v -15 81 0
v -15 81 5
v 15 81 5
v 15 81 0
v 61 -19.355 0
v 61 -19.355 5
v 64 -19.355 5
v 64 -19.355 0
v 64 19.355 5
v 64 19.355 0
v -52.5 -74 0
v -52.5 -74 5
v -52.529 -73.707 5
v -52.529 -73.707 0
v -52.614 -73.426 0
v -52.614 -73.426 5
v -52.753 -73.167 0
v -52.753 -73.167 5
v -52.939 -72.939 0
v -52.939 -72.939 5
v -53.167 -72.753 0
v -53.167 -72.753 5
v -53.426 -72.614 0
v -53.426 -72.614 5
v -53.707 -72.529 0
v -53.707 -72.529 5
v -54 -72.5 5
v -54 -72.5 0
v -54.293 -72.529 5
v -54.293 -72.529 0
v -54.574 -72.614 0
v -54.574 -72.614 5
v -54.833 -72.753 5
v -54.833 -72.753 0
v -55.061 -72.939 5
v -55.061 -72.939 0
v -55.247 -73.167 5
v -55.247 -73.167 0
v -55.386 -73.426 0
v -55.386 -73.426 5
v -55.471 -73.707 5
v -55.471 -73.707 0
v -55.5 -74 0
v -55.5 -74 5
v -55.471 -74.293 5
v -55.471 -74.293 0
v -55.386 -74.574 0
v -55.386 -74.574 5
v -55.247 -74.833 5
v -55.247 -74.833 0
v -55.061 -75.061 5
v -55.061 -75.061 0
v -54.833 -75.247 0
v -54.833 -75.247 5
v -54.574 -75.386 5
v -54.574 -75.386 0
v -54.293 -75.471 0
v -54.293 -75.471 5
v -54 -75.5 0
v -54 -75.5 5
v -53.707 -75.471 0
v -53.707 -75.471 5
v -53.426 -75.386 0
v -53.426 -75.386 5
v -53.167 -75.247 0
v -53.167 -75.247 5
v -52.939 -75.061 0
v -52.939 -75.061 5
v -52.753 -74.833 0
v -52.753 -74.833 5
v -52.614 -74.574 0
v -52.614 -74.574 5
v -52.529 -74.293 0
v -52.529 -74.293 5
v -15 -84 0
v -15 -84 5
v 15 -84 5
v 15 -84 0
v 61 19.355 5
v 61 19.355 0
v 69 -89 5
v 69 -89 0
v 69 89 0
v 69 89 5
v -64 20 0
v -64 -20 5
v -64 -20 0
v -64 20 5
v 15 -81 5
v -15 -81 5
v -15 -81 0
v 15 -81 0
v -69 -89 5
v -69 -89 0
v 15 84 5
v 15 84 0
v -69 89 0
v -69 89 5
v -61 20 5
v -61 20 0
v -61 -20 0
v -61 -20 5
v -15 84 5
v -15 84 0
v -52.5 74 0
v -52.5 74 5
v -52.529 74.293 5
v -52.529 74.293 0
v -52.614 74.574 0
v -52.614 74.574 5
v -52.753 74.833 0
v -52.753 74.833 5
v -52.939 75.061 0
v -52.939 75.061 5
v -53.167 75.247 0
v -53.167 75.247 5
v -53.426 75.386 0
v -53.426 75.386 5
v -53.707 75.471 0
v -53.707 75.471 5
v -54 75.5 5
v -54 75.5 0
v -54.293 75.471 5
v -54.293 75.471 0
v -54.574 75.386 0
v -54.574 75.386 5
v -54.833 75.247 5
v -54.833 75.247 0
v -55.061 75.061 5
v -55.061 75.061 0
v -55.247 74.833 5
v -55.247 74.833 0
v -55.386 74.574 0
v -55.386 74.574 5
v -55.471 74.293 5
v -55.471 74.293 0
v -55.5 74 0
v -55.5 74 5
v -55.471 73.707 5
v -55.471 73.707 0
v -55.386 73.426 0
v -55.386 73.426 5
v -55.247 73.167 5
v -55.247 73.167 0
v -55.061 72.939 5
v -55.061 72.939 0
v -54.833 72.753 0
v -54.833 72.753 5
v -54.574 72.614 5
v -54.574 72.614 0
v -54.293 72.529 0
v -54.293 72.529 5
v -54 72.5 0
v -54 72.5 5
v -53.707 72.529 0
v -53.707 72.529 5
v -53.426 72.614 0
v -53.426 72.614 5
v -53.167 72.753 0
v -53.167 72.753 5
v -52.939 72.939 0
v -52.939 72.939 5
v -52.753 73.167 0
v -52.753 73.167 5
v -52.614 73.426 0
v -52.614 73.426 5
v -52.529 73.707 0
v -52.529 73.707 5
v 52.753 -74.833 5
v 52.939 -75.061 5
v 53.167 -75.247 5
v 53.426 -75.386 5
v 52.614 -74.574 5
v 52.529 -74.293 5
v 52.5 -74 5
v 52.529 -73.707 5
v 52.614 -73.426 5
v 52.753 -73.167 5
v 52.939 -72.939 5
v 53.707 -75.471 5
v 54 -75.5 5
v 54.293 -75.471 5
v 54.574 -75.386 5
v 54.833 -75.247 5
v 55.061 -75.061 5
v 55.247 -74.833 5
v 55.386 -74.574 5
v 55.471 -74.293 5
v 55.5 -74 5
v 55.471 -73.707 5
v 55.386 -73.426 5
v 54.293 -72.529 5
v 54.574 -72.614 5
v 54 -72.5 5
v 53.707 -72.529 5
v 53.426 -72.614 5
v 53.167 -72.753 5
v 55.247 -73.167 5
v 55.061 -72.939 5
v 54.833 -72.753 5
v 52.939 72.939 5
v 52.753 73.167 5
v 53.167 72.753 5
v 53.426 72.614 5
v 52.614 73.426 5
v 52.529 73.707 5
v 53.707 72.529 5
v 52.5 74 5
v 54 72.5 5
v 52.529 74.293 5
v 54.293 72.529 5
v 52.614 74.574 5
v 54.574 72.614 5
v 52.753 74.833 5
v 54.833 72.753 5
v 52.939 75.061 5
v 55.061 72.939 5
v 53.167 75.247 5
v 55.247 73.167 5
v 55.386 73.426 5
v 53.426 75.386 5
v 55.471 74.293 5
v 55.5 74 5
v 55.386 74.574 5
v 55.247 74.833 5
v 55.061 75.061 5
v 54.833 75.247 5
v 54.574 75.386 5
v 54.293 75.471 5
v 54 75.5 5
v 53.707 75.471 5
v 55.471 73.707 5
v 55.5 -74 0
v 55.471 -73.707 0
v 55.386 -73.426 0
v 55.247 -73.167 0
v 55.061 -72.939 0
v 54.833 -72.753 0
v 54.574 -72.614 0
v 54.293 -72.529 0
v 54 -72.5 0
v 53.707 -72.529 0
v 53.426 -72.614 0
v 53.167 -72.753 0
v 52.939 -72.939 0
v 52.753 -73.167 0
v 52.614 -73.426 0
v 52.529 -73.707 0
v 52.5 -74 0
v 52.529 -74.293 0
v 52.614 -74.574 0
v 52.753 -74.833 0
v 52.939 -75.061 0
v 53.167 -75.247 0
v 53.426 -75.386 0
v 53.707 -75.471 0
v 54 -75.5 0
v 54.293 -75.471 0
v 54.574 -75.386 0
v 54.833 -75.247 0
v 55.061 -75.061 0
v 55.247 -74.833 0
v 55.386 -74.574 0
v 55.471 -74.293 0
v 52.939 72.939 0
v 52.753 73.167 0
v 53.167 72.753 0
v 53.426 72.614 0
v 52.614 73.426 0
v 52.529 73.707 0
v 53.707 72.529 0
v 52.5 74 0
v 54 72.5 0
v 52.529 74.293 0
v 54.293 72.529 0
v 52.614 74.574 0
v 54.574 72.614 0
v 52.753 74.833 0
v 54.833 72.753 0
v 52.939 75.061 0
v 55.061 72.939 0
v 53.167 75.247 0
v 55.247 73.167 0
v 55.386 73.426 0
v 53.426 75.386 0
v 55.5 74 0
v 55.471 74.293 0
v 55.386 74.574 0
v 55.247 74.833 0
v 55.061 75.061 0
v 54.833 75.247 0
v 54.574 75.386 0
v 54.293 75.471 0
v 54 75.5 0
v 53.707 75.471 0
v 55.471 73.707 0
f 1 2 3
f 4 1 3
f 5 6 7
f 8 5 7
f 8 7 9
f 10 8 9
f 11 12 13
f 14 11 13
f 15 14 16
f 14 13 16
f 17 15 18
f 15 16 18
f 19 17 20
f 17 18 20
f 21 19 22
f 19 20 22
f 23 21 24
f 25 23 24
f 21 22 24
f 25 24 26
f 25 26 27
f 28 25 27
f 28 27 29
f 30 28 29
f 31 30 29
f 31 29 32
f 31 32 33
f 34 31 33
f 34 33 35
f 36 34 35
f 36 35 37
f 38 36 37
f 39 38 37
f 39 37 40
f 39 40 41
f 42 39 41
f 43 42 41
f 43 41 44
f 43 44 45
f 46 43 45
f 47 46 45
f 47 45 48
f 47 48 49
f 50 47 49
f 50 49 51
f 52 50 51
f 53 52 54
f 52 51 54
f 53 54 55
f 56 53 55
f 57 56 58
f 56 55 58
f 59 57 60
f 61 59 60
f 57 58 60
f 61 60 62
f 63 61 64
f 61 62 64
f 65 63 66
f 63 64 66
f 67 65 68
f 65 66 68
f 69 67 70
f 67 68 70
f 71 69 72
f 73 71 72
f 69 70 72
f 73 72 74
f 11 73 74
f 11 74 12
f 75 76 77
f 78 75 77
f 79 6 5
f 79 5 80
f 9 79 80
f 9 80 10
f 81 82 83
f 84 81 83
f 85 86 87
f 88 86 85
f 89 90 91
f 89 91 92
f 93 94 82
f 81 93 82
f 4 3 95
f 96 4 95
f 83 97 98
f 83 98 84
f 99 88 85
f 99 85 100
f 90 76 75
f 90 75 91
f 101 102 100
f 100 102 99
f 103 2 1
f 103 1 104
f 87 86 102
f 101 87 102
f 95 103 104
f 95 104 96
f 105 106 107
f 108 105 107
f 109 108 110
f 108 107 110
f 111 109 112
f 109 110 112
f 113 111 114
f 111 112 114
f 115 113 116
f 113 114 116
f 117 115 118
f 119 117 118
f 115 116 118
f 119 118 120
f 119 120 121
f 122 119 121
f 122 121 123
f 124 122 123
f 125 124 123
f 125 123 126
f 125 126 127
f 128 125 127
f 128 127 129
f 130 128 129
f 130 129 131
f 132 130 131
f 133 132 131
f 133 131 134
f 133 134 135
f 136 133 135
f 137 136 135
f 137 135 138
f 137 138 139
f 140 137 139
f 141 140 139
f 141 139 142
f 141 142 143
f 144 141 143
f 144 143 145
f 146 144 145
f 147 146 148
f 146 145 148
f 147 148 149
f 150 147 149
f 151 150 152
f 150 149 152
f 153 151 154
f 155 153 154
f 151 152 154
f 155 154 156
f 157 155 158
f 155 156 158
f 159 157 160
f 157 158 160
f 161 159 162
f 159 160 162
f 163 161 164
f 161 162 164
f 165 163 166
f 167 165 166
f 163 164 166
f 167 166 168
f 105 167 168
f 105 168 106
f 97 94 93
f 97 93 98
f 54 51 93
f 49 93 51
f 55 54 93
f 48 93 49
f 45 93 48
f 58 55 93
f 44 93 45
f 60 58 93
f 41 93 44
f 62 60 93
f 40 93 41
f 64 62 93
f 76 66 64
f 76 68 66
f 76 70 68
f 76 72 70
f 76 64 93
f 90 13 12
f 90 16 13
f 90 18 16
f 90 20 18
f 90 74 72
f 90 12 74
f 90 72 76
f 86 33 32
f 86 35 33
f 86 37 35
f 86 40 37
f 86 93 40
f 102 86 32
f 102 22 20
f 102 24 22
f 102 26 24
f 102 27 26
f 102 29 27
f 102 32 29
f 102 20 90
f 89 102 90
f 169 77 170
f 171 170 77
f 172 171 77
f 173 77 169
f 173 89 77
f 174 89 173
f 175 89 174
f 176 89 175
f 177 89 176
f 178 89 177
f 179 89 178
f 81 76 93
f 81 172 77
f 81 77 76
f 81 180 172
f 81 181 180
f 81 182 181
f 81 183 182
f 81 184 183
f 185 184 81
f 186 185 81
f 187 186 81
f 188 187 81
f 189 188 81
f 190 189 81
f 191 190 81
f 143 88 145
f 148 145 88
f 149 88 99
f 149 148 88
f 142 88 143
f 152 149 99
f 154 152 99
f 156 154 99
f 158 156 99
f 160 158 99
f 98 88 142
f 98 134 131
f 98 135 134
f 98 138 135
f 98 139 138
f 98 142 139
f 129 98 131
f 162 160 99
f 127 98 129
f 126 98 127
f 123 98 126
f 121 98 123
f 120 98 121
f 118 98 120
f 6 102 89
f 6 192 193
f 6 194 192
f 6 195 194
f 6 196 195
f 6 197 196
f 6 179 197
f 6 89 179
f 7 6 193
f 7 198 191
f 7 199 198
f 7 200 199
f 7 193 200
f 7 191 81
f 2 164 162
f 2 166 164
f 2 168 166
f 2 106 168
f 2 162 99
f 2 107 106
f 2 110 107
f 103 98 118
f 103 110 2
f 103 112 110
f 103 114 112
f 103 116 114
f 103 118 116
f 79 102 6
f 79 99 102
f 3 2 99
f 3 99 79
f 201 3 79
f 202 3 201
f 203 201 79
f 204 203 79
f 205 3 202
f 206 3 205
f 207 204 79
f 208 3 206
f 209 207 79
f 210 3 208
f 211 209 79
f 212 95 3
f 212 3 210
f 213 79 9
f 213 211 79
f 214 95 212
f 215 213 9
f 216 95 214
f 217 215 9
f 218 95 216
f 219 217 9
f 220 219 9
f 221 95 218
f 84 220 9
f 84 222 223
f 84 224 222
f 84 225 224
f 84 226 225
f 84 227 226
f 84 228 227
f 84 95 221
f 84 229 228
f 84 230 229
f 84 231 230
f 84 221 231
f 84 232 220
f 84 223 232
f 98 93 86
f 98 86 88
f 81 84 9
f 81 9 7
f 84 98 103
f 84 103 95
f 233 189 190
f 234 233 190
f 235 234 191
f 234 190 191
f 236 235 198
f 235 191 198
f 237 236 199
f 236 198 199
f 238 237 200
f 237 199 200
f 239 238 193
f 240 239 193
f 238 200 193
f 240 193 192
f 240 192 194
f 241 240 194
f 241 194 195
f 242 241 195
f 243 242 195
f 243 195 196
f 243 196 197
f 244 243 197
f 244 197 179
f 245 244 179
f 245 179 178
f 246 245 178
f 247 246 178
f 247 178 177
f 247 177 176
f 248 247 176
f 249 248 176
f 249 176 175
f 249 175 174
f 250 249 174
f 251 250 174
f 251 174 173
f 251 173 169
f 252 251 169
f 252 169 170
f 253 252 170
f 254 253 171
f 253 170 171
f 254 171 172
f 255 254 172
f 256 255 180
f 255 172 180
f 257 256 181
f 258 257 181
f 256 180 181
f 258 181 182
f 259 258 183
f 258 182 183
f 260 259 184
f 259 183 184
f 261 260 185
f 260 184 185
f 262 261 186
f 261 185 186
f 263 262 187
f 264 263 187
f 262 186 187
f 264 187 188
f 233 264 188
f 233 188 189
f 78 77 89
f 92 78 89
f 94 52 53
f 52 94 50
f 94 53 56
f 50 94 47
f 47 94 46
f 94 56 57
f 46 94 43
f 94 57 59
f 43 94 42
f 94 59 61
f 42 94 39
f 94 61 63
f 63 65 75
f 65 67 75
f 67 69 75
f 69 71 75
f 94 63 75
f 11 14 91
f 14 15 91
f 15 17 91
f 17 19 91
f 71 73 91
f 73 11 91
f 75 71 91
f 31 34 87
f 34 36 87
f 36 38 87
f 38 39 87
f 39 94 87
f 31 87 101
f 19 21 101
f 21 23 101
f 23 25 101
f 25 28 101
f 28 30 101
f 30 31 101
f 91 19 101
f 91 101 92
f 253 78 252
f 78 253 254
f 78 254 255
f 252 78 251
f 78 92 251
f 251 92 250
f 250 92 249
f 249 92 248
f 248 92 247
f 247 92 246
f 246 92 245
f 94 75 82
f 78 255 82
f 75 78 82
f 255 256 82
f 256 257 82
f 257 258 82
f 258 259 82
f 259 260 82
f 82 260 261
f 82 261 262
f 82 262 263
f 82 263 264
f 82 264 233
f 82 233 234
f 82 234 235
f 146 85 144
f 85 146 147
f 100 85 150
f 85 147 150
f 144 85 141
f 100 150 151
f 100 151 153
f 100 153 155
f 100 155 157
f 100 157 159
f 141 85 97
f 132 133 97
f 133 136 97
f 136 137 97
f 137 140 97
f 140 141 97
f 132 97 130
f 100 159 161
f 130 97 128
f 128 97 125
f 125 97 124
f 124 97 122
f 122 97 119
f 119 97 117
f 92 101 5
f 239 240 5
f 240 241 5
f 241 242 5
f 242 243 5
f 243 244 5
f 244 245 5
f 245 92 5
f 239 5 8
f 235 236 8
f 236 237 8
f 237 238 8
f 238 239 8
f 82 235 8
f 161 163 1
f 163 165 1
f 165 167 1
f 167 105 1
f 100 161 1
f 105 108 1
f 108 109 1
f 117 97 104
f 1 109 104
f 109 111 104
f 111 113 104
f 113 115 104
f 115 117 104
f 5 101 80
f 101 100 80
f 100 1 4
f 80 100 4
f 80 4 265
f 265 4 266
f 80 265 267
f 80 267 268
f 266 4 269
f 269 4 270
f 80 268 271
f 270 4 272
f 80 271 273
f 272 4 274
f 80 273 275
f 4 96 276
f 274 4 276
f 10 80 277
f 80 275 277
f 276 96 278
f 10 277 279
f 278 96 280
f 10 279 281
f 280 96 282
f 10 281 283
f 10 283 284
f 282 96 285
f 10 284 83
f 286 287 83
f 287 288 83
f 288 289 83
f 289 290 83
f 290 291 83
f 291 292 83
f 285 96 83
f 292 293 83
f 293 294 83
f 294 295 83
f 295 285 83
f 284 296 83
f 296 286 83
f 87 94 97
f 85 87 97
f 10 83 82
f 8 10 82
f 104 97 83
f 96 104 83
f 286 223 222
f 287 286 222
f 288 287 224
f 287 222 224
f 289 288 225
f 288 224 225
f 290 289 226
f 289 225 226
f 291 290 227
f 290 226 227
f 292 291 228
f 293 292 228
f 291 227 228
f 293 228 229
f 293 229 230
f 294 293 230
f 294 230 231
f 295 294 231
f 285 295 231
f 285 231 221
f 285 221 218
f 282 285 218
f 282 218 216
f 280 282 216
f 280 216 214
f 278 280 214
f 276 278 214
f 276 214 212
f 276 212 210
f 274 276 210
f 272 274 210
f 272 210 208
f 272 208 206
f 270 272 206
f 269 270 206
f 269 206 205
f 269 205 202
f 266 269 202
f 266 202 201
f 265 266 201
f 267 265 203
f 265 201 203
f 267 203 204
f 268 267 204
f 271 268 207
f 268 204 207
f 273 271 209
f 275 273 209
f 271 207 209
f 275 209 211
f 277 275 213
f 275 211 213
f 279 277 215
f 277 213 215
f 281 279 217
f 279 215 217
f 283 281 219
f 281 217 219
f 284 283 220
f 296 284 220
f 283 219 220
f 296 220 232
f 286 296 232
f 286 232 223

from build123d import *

# Parameters (mm, degrees)
SKETCH2_W           = 138
SKETCH2_H           = 178
BOSS_EXTRUDE1_DEPTH = 5
SKETCH3_W           = 30
SKETCH3_H           = 3
CUT_EXTRUDE1_DEPTH  = 6
SKETCH4_W           = 30
SKETCH4_H           = 3
CUT_EXTRUDE2_DEPTH  = 8
SKETCH6_W           = 3
SKETCH6_H           = 38.70967742
CUT_EXTRUDE3_DEPTH  = 8
SKETCH5_W           = 3
SKETCH5_H           = 40
CUT_EXTRUDE4_DEPTH  = 8
SKETCH8_R           = 1.5
CUT_EXTRUDE5_DEPTH  = 6


with BuildPart() as part:
    # Sketch2 → Boss-Extrude1 (new body)
    with BuildSketch(Plane.XY):
        Rectangle(SKETCH2_W, SKETCH2_H)
    extrude(amount=BOSS_EXTRUDE1_DEPTH)

    # Sketch3 → Cut-Extrude1 (cut, through all)
    with BuildSketch(Plane.XY.offset(5)):
        with Locations((0, 82.5)):
            Rectangle(SKETCH3_W, SKETCH3_H)
    extrude(amount=-CUT_EXTRUDE1_DEPTH, mode=Mode.SUBTRACT)

    # Sketch4 → Cut-Extrude2 (cut)
    with BuildSketch(Plane.XY.offset(5)):
        with Locations((0, -82.5)):
            Rectangle(SKETCH4_W, SKETCH4_H)
    extrude(amount=-CUT_EXTRUDE2_DEPTH, mode=Mode.SUBTRACT)

    # Sketch6 → Cut-Extrude3 (cut)
    with BuildSketch(Plane.XY.offset(5)):
        with Locations((62.5, 0)):
            Rectangle(SKETCH6_W, SKETCH6_H)
    extrude(amount=-CUT_EXTRUDE3_DEPTH, mode=Mode.SUBTRACT)

    # Sketch5 → Cut-Extrude4 (cut)
    with BuildSketch(Plane.XY.offset(5)):
        with Locations((-62.5, 0)):
            Rectangle(SKETCH5_W, SKETCH5_H)
    extrude(amount=-CUT_EXTRUDE4_DEPTH, mode=Mode.SUBTRACT)

    # Sketch8 → Cut-Extrude5 (cut, through all)
    with BuildSketch(Plane.XY.offset(5)):
        with Locations((54, -74)):
            Circle(SKETCH8_R)
        with Locations((54, 74)):
            Circle(SKETCH8_R)
        with Locations((-54, 74)):
            Circle(SKETCH8_R)
        with Locations((-54, -74)):
            Circle(SKETCH8_R)
    extrude(amount=-CUT_EXTRUDE5_DEPTH, mode=Mode.SUBTRACT)


solid = part.part
